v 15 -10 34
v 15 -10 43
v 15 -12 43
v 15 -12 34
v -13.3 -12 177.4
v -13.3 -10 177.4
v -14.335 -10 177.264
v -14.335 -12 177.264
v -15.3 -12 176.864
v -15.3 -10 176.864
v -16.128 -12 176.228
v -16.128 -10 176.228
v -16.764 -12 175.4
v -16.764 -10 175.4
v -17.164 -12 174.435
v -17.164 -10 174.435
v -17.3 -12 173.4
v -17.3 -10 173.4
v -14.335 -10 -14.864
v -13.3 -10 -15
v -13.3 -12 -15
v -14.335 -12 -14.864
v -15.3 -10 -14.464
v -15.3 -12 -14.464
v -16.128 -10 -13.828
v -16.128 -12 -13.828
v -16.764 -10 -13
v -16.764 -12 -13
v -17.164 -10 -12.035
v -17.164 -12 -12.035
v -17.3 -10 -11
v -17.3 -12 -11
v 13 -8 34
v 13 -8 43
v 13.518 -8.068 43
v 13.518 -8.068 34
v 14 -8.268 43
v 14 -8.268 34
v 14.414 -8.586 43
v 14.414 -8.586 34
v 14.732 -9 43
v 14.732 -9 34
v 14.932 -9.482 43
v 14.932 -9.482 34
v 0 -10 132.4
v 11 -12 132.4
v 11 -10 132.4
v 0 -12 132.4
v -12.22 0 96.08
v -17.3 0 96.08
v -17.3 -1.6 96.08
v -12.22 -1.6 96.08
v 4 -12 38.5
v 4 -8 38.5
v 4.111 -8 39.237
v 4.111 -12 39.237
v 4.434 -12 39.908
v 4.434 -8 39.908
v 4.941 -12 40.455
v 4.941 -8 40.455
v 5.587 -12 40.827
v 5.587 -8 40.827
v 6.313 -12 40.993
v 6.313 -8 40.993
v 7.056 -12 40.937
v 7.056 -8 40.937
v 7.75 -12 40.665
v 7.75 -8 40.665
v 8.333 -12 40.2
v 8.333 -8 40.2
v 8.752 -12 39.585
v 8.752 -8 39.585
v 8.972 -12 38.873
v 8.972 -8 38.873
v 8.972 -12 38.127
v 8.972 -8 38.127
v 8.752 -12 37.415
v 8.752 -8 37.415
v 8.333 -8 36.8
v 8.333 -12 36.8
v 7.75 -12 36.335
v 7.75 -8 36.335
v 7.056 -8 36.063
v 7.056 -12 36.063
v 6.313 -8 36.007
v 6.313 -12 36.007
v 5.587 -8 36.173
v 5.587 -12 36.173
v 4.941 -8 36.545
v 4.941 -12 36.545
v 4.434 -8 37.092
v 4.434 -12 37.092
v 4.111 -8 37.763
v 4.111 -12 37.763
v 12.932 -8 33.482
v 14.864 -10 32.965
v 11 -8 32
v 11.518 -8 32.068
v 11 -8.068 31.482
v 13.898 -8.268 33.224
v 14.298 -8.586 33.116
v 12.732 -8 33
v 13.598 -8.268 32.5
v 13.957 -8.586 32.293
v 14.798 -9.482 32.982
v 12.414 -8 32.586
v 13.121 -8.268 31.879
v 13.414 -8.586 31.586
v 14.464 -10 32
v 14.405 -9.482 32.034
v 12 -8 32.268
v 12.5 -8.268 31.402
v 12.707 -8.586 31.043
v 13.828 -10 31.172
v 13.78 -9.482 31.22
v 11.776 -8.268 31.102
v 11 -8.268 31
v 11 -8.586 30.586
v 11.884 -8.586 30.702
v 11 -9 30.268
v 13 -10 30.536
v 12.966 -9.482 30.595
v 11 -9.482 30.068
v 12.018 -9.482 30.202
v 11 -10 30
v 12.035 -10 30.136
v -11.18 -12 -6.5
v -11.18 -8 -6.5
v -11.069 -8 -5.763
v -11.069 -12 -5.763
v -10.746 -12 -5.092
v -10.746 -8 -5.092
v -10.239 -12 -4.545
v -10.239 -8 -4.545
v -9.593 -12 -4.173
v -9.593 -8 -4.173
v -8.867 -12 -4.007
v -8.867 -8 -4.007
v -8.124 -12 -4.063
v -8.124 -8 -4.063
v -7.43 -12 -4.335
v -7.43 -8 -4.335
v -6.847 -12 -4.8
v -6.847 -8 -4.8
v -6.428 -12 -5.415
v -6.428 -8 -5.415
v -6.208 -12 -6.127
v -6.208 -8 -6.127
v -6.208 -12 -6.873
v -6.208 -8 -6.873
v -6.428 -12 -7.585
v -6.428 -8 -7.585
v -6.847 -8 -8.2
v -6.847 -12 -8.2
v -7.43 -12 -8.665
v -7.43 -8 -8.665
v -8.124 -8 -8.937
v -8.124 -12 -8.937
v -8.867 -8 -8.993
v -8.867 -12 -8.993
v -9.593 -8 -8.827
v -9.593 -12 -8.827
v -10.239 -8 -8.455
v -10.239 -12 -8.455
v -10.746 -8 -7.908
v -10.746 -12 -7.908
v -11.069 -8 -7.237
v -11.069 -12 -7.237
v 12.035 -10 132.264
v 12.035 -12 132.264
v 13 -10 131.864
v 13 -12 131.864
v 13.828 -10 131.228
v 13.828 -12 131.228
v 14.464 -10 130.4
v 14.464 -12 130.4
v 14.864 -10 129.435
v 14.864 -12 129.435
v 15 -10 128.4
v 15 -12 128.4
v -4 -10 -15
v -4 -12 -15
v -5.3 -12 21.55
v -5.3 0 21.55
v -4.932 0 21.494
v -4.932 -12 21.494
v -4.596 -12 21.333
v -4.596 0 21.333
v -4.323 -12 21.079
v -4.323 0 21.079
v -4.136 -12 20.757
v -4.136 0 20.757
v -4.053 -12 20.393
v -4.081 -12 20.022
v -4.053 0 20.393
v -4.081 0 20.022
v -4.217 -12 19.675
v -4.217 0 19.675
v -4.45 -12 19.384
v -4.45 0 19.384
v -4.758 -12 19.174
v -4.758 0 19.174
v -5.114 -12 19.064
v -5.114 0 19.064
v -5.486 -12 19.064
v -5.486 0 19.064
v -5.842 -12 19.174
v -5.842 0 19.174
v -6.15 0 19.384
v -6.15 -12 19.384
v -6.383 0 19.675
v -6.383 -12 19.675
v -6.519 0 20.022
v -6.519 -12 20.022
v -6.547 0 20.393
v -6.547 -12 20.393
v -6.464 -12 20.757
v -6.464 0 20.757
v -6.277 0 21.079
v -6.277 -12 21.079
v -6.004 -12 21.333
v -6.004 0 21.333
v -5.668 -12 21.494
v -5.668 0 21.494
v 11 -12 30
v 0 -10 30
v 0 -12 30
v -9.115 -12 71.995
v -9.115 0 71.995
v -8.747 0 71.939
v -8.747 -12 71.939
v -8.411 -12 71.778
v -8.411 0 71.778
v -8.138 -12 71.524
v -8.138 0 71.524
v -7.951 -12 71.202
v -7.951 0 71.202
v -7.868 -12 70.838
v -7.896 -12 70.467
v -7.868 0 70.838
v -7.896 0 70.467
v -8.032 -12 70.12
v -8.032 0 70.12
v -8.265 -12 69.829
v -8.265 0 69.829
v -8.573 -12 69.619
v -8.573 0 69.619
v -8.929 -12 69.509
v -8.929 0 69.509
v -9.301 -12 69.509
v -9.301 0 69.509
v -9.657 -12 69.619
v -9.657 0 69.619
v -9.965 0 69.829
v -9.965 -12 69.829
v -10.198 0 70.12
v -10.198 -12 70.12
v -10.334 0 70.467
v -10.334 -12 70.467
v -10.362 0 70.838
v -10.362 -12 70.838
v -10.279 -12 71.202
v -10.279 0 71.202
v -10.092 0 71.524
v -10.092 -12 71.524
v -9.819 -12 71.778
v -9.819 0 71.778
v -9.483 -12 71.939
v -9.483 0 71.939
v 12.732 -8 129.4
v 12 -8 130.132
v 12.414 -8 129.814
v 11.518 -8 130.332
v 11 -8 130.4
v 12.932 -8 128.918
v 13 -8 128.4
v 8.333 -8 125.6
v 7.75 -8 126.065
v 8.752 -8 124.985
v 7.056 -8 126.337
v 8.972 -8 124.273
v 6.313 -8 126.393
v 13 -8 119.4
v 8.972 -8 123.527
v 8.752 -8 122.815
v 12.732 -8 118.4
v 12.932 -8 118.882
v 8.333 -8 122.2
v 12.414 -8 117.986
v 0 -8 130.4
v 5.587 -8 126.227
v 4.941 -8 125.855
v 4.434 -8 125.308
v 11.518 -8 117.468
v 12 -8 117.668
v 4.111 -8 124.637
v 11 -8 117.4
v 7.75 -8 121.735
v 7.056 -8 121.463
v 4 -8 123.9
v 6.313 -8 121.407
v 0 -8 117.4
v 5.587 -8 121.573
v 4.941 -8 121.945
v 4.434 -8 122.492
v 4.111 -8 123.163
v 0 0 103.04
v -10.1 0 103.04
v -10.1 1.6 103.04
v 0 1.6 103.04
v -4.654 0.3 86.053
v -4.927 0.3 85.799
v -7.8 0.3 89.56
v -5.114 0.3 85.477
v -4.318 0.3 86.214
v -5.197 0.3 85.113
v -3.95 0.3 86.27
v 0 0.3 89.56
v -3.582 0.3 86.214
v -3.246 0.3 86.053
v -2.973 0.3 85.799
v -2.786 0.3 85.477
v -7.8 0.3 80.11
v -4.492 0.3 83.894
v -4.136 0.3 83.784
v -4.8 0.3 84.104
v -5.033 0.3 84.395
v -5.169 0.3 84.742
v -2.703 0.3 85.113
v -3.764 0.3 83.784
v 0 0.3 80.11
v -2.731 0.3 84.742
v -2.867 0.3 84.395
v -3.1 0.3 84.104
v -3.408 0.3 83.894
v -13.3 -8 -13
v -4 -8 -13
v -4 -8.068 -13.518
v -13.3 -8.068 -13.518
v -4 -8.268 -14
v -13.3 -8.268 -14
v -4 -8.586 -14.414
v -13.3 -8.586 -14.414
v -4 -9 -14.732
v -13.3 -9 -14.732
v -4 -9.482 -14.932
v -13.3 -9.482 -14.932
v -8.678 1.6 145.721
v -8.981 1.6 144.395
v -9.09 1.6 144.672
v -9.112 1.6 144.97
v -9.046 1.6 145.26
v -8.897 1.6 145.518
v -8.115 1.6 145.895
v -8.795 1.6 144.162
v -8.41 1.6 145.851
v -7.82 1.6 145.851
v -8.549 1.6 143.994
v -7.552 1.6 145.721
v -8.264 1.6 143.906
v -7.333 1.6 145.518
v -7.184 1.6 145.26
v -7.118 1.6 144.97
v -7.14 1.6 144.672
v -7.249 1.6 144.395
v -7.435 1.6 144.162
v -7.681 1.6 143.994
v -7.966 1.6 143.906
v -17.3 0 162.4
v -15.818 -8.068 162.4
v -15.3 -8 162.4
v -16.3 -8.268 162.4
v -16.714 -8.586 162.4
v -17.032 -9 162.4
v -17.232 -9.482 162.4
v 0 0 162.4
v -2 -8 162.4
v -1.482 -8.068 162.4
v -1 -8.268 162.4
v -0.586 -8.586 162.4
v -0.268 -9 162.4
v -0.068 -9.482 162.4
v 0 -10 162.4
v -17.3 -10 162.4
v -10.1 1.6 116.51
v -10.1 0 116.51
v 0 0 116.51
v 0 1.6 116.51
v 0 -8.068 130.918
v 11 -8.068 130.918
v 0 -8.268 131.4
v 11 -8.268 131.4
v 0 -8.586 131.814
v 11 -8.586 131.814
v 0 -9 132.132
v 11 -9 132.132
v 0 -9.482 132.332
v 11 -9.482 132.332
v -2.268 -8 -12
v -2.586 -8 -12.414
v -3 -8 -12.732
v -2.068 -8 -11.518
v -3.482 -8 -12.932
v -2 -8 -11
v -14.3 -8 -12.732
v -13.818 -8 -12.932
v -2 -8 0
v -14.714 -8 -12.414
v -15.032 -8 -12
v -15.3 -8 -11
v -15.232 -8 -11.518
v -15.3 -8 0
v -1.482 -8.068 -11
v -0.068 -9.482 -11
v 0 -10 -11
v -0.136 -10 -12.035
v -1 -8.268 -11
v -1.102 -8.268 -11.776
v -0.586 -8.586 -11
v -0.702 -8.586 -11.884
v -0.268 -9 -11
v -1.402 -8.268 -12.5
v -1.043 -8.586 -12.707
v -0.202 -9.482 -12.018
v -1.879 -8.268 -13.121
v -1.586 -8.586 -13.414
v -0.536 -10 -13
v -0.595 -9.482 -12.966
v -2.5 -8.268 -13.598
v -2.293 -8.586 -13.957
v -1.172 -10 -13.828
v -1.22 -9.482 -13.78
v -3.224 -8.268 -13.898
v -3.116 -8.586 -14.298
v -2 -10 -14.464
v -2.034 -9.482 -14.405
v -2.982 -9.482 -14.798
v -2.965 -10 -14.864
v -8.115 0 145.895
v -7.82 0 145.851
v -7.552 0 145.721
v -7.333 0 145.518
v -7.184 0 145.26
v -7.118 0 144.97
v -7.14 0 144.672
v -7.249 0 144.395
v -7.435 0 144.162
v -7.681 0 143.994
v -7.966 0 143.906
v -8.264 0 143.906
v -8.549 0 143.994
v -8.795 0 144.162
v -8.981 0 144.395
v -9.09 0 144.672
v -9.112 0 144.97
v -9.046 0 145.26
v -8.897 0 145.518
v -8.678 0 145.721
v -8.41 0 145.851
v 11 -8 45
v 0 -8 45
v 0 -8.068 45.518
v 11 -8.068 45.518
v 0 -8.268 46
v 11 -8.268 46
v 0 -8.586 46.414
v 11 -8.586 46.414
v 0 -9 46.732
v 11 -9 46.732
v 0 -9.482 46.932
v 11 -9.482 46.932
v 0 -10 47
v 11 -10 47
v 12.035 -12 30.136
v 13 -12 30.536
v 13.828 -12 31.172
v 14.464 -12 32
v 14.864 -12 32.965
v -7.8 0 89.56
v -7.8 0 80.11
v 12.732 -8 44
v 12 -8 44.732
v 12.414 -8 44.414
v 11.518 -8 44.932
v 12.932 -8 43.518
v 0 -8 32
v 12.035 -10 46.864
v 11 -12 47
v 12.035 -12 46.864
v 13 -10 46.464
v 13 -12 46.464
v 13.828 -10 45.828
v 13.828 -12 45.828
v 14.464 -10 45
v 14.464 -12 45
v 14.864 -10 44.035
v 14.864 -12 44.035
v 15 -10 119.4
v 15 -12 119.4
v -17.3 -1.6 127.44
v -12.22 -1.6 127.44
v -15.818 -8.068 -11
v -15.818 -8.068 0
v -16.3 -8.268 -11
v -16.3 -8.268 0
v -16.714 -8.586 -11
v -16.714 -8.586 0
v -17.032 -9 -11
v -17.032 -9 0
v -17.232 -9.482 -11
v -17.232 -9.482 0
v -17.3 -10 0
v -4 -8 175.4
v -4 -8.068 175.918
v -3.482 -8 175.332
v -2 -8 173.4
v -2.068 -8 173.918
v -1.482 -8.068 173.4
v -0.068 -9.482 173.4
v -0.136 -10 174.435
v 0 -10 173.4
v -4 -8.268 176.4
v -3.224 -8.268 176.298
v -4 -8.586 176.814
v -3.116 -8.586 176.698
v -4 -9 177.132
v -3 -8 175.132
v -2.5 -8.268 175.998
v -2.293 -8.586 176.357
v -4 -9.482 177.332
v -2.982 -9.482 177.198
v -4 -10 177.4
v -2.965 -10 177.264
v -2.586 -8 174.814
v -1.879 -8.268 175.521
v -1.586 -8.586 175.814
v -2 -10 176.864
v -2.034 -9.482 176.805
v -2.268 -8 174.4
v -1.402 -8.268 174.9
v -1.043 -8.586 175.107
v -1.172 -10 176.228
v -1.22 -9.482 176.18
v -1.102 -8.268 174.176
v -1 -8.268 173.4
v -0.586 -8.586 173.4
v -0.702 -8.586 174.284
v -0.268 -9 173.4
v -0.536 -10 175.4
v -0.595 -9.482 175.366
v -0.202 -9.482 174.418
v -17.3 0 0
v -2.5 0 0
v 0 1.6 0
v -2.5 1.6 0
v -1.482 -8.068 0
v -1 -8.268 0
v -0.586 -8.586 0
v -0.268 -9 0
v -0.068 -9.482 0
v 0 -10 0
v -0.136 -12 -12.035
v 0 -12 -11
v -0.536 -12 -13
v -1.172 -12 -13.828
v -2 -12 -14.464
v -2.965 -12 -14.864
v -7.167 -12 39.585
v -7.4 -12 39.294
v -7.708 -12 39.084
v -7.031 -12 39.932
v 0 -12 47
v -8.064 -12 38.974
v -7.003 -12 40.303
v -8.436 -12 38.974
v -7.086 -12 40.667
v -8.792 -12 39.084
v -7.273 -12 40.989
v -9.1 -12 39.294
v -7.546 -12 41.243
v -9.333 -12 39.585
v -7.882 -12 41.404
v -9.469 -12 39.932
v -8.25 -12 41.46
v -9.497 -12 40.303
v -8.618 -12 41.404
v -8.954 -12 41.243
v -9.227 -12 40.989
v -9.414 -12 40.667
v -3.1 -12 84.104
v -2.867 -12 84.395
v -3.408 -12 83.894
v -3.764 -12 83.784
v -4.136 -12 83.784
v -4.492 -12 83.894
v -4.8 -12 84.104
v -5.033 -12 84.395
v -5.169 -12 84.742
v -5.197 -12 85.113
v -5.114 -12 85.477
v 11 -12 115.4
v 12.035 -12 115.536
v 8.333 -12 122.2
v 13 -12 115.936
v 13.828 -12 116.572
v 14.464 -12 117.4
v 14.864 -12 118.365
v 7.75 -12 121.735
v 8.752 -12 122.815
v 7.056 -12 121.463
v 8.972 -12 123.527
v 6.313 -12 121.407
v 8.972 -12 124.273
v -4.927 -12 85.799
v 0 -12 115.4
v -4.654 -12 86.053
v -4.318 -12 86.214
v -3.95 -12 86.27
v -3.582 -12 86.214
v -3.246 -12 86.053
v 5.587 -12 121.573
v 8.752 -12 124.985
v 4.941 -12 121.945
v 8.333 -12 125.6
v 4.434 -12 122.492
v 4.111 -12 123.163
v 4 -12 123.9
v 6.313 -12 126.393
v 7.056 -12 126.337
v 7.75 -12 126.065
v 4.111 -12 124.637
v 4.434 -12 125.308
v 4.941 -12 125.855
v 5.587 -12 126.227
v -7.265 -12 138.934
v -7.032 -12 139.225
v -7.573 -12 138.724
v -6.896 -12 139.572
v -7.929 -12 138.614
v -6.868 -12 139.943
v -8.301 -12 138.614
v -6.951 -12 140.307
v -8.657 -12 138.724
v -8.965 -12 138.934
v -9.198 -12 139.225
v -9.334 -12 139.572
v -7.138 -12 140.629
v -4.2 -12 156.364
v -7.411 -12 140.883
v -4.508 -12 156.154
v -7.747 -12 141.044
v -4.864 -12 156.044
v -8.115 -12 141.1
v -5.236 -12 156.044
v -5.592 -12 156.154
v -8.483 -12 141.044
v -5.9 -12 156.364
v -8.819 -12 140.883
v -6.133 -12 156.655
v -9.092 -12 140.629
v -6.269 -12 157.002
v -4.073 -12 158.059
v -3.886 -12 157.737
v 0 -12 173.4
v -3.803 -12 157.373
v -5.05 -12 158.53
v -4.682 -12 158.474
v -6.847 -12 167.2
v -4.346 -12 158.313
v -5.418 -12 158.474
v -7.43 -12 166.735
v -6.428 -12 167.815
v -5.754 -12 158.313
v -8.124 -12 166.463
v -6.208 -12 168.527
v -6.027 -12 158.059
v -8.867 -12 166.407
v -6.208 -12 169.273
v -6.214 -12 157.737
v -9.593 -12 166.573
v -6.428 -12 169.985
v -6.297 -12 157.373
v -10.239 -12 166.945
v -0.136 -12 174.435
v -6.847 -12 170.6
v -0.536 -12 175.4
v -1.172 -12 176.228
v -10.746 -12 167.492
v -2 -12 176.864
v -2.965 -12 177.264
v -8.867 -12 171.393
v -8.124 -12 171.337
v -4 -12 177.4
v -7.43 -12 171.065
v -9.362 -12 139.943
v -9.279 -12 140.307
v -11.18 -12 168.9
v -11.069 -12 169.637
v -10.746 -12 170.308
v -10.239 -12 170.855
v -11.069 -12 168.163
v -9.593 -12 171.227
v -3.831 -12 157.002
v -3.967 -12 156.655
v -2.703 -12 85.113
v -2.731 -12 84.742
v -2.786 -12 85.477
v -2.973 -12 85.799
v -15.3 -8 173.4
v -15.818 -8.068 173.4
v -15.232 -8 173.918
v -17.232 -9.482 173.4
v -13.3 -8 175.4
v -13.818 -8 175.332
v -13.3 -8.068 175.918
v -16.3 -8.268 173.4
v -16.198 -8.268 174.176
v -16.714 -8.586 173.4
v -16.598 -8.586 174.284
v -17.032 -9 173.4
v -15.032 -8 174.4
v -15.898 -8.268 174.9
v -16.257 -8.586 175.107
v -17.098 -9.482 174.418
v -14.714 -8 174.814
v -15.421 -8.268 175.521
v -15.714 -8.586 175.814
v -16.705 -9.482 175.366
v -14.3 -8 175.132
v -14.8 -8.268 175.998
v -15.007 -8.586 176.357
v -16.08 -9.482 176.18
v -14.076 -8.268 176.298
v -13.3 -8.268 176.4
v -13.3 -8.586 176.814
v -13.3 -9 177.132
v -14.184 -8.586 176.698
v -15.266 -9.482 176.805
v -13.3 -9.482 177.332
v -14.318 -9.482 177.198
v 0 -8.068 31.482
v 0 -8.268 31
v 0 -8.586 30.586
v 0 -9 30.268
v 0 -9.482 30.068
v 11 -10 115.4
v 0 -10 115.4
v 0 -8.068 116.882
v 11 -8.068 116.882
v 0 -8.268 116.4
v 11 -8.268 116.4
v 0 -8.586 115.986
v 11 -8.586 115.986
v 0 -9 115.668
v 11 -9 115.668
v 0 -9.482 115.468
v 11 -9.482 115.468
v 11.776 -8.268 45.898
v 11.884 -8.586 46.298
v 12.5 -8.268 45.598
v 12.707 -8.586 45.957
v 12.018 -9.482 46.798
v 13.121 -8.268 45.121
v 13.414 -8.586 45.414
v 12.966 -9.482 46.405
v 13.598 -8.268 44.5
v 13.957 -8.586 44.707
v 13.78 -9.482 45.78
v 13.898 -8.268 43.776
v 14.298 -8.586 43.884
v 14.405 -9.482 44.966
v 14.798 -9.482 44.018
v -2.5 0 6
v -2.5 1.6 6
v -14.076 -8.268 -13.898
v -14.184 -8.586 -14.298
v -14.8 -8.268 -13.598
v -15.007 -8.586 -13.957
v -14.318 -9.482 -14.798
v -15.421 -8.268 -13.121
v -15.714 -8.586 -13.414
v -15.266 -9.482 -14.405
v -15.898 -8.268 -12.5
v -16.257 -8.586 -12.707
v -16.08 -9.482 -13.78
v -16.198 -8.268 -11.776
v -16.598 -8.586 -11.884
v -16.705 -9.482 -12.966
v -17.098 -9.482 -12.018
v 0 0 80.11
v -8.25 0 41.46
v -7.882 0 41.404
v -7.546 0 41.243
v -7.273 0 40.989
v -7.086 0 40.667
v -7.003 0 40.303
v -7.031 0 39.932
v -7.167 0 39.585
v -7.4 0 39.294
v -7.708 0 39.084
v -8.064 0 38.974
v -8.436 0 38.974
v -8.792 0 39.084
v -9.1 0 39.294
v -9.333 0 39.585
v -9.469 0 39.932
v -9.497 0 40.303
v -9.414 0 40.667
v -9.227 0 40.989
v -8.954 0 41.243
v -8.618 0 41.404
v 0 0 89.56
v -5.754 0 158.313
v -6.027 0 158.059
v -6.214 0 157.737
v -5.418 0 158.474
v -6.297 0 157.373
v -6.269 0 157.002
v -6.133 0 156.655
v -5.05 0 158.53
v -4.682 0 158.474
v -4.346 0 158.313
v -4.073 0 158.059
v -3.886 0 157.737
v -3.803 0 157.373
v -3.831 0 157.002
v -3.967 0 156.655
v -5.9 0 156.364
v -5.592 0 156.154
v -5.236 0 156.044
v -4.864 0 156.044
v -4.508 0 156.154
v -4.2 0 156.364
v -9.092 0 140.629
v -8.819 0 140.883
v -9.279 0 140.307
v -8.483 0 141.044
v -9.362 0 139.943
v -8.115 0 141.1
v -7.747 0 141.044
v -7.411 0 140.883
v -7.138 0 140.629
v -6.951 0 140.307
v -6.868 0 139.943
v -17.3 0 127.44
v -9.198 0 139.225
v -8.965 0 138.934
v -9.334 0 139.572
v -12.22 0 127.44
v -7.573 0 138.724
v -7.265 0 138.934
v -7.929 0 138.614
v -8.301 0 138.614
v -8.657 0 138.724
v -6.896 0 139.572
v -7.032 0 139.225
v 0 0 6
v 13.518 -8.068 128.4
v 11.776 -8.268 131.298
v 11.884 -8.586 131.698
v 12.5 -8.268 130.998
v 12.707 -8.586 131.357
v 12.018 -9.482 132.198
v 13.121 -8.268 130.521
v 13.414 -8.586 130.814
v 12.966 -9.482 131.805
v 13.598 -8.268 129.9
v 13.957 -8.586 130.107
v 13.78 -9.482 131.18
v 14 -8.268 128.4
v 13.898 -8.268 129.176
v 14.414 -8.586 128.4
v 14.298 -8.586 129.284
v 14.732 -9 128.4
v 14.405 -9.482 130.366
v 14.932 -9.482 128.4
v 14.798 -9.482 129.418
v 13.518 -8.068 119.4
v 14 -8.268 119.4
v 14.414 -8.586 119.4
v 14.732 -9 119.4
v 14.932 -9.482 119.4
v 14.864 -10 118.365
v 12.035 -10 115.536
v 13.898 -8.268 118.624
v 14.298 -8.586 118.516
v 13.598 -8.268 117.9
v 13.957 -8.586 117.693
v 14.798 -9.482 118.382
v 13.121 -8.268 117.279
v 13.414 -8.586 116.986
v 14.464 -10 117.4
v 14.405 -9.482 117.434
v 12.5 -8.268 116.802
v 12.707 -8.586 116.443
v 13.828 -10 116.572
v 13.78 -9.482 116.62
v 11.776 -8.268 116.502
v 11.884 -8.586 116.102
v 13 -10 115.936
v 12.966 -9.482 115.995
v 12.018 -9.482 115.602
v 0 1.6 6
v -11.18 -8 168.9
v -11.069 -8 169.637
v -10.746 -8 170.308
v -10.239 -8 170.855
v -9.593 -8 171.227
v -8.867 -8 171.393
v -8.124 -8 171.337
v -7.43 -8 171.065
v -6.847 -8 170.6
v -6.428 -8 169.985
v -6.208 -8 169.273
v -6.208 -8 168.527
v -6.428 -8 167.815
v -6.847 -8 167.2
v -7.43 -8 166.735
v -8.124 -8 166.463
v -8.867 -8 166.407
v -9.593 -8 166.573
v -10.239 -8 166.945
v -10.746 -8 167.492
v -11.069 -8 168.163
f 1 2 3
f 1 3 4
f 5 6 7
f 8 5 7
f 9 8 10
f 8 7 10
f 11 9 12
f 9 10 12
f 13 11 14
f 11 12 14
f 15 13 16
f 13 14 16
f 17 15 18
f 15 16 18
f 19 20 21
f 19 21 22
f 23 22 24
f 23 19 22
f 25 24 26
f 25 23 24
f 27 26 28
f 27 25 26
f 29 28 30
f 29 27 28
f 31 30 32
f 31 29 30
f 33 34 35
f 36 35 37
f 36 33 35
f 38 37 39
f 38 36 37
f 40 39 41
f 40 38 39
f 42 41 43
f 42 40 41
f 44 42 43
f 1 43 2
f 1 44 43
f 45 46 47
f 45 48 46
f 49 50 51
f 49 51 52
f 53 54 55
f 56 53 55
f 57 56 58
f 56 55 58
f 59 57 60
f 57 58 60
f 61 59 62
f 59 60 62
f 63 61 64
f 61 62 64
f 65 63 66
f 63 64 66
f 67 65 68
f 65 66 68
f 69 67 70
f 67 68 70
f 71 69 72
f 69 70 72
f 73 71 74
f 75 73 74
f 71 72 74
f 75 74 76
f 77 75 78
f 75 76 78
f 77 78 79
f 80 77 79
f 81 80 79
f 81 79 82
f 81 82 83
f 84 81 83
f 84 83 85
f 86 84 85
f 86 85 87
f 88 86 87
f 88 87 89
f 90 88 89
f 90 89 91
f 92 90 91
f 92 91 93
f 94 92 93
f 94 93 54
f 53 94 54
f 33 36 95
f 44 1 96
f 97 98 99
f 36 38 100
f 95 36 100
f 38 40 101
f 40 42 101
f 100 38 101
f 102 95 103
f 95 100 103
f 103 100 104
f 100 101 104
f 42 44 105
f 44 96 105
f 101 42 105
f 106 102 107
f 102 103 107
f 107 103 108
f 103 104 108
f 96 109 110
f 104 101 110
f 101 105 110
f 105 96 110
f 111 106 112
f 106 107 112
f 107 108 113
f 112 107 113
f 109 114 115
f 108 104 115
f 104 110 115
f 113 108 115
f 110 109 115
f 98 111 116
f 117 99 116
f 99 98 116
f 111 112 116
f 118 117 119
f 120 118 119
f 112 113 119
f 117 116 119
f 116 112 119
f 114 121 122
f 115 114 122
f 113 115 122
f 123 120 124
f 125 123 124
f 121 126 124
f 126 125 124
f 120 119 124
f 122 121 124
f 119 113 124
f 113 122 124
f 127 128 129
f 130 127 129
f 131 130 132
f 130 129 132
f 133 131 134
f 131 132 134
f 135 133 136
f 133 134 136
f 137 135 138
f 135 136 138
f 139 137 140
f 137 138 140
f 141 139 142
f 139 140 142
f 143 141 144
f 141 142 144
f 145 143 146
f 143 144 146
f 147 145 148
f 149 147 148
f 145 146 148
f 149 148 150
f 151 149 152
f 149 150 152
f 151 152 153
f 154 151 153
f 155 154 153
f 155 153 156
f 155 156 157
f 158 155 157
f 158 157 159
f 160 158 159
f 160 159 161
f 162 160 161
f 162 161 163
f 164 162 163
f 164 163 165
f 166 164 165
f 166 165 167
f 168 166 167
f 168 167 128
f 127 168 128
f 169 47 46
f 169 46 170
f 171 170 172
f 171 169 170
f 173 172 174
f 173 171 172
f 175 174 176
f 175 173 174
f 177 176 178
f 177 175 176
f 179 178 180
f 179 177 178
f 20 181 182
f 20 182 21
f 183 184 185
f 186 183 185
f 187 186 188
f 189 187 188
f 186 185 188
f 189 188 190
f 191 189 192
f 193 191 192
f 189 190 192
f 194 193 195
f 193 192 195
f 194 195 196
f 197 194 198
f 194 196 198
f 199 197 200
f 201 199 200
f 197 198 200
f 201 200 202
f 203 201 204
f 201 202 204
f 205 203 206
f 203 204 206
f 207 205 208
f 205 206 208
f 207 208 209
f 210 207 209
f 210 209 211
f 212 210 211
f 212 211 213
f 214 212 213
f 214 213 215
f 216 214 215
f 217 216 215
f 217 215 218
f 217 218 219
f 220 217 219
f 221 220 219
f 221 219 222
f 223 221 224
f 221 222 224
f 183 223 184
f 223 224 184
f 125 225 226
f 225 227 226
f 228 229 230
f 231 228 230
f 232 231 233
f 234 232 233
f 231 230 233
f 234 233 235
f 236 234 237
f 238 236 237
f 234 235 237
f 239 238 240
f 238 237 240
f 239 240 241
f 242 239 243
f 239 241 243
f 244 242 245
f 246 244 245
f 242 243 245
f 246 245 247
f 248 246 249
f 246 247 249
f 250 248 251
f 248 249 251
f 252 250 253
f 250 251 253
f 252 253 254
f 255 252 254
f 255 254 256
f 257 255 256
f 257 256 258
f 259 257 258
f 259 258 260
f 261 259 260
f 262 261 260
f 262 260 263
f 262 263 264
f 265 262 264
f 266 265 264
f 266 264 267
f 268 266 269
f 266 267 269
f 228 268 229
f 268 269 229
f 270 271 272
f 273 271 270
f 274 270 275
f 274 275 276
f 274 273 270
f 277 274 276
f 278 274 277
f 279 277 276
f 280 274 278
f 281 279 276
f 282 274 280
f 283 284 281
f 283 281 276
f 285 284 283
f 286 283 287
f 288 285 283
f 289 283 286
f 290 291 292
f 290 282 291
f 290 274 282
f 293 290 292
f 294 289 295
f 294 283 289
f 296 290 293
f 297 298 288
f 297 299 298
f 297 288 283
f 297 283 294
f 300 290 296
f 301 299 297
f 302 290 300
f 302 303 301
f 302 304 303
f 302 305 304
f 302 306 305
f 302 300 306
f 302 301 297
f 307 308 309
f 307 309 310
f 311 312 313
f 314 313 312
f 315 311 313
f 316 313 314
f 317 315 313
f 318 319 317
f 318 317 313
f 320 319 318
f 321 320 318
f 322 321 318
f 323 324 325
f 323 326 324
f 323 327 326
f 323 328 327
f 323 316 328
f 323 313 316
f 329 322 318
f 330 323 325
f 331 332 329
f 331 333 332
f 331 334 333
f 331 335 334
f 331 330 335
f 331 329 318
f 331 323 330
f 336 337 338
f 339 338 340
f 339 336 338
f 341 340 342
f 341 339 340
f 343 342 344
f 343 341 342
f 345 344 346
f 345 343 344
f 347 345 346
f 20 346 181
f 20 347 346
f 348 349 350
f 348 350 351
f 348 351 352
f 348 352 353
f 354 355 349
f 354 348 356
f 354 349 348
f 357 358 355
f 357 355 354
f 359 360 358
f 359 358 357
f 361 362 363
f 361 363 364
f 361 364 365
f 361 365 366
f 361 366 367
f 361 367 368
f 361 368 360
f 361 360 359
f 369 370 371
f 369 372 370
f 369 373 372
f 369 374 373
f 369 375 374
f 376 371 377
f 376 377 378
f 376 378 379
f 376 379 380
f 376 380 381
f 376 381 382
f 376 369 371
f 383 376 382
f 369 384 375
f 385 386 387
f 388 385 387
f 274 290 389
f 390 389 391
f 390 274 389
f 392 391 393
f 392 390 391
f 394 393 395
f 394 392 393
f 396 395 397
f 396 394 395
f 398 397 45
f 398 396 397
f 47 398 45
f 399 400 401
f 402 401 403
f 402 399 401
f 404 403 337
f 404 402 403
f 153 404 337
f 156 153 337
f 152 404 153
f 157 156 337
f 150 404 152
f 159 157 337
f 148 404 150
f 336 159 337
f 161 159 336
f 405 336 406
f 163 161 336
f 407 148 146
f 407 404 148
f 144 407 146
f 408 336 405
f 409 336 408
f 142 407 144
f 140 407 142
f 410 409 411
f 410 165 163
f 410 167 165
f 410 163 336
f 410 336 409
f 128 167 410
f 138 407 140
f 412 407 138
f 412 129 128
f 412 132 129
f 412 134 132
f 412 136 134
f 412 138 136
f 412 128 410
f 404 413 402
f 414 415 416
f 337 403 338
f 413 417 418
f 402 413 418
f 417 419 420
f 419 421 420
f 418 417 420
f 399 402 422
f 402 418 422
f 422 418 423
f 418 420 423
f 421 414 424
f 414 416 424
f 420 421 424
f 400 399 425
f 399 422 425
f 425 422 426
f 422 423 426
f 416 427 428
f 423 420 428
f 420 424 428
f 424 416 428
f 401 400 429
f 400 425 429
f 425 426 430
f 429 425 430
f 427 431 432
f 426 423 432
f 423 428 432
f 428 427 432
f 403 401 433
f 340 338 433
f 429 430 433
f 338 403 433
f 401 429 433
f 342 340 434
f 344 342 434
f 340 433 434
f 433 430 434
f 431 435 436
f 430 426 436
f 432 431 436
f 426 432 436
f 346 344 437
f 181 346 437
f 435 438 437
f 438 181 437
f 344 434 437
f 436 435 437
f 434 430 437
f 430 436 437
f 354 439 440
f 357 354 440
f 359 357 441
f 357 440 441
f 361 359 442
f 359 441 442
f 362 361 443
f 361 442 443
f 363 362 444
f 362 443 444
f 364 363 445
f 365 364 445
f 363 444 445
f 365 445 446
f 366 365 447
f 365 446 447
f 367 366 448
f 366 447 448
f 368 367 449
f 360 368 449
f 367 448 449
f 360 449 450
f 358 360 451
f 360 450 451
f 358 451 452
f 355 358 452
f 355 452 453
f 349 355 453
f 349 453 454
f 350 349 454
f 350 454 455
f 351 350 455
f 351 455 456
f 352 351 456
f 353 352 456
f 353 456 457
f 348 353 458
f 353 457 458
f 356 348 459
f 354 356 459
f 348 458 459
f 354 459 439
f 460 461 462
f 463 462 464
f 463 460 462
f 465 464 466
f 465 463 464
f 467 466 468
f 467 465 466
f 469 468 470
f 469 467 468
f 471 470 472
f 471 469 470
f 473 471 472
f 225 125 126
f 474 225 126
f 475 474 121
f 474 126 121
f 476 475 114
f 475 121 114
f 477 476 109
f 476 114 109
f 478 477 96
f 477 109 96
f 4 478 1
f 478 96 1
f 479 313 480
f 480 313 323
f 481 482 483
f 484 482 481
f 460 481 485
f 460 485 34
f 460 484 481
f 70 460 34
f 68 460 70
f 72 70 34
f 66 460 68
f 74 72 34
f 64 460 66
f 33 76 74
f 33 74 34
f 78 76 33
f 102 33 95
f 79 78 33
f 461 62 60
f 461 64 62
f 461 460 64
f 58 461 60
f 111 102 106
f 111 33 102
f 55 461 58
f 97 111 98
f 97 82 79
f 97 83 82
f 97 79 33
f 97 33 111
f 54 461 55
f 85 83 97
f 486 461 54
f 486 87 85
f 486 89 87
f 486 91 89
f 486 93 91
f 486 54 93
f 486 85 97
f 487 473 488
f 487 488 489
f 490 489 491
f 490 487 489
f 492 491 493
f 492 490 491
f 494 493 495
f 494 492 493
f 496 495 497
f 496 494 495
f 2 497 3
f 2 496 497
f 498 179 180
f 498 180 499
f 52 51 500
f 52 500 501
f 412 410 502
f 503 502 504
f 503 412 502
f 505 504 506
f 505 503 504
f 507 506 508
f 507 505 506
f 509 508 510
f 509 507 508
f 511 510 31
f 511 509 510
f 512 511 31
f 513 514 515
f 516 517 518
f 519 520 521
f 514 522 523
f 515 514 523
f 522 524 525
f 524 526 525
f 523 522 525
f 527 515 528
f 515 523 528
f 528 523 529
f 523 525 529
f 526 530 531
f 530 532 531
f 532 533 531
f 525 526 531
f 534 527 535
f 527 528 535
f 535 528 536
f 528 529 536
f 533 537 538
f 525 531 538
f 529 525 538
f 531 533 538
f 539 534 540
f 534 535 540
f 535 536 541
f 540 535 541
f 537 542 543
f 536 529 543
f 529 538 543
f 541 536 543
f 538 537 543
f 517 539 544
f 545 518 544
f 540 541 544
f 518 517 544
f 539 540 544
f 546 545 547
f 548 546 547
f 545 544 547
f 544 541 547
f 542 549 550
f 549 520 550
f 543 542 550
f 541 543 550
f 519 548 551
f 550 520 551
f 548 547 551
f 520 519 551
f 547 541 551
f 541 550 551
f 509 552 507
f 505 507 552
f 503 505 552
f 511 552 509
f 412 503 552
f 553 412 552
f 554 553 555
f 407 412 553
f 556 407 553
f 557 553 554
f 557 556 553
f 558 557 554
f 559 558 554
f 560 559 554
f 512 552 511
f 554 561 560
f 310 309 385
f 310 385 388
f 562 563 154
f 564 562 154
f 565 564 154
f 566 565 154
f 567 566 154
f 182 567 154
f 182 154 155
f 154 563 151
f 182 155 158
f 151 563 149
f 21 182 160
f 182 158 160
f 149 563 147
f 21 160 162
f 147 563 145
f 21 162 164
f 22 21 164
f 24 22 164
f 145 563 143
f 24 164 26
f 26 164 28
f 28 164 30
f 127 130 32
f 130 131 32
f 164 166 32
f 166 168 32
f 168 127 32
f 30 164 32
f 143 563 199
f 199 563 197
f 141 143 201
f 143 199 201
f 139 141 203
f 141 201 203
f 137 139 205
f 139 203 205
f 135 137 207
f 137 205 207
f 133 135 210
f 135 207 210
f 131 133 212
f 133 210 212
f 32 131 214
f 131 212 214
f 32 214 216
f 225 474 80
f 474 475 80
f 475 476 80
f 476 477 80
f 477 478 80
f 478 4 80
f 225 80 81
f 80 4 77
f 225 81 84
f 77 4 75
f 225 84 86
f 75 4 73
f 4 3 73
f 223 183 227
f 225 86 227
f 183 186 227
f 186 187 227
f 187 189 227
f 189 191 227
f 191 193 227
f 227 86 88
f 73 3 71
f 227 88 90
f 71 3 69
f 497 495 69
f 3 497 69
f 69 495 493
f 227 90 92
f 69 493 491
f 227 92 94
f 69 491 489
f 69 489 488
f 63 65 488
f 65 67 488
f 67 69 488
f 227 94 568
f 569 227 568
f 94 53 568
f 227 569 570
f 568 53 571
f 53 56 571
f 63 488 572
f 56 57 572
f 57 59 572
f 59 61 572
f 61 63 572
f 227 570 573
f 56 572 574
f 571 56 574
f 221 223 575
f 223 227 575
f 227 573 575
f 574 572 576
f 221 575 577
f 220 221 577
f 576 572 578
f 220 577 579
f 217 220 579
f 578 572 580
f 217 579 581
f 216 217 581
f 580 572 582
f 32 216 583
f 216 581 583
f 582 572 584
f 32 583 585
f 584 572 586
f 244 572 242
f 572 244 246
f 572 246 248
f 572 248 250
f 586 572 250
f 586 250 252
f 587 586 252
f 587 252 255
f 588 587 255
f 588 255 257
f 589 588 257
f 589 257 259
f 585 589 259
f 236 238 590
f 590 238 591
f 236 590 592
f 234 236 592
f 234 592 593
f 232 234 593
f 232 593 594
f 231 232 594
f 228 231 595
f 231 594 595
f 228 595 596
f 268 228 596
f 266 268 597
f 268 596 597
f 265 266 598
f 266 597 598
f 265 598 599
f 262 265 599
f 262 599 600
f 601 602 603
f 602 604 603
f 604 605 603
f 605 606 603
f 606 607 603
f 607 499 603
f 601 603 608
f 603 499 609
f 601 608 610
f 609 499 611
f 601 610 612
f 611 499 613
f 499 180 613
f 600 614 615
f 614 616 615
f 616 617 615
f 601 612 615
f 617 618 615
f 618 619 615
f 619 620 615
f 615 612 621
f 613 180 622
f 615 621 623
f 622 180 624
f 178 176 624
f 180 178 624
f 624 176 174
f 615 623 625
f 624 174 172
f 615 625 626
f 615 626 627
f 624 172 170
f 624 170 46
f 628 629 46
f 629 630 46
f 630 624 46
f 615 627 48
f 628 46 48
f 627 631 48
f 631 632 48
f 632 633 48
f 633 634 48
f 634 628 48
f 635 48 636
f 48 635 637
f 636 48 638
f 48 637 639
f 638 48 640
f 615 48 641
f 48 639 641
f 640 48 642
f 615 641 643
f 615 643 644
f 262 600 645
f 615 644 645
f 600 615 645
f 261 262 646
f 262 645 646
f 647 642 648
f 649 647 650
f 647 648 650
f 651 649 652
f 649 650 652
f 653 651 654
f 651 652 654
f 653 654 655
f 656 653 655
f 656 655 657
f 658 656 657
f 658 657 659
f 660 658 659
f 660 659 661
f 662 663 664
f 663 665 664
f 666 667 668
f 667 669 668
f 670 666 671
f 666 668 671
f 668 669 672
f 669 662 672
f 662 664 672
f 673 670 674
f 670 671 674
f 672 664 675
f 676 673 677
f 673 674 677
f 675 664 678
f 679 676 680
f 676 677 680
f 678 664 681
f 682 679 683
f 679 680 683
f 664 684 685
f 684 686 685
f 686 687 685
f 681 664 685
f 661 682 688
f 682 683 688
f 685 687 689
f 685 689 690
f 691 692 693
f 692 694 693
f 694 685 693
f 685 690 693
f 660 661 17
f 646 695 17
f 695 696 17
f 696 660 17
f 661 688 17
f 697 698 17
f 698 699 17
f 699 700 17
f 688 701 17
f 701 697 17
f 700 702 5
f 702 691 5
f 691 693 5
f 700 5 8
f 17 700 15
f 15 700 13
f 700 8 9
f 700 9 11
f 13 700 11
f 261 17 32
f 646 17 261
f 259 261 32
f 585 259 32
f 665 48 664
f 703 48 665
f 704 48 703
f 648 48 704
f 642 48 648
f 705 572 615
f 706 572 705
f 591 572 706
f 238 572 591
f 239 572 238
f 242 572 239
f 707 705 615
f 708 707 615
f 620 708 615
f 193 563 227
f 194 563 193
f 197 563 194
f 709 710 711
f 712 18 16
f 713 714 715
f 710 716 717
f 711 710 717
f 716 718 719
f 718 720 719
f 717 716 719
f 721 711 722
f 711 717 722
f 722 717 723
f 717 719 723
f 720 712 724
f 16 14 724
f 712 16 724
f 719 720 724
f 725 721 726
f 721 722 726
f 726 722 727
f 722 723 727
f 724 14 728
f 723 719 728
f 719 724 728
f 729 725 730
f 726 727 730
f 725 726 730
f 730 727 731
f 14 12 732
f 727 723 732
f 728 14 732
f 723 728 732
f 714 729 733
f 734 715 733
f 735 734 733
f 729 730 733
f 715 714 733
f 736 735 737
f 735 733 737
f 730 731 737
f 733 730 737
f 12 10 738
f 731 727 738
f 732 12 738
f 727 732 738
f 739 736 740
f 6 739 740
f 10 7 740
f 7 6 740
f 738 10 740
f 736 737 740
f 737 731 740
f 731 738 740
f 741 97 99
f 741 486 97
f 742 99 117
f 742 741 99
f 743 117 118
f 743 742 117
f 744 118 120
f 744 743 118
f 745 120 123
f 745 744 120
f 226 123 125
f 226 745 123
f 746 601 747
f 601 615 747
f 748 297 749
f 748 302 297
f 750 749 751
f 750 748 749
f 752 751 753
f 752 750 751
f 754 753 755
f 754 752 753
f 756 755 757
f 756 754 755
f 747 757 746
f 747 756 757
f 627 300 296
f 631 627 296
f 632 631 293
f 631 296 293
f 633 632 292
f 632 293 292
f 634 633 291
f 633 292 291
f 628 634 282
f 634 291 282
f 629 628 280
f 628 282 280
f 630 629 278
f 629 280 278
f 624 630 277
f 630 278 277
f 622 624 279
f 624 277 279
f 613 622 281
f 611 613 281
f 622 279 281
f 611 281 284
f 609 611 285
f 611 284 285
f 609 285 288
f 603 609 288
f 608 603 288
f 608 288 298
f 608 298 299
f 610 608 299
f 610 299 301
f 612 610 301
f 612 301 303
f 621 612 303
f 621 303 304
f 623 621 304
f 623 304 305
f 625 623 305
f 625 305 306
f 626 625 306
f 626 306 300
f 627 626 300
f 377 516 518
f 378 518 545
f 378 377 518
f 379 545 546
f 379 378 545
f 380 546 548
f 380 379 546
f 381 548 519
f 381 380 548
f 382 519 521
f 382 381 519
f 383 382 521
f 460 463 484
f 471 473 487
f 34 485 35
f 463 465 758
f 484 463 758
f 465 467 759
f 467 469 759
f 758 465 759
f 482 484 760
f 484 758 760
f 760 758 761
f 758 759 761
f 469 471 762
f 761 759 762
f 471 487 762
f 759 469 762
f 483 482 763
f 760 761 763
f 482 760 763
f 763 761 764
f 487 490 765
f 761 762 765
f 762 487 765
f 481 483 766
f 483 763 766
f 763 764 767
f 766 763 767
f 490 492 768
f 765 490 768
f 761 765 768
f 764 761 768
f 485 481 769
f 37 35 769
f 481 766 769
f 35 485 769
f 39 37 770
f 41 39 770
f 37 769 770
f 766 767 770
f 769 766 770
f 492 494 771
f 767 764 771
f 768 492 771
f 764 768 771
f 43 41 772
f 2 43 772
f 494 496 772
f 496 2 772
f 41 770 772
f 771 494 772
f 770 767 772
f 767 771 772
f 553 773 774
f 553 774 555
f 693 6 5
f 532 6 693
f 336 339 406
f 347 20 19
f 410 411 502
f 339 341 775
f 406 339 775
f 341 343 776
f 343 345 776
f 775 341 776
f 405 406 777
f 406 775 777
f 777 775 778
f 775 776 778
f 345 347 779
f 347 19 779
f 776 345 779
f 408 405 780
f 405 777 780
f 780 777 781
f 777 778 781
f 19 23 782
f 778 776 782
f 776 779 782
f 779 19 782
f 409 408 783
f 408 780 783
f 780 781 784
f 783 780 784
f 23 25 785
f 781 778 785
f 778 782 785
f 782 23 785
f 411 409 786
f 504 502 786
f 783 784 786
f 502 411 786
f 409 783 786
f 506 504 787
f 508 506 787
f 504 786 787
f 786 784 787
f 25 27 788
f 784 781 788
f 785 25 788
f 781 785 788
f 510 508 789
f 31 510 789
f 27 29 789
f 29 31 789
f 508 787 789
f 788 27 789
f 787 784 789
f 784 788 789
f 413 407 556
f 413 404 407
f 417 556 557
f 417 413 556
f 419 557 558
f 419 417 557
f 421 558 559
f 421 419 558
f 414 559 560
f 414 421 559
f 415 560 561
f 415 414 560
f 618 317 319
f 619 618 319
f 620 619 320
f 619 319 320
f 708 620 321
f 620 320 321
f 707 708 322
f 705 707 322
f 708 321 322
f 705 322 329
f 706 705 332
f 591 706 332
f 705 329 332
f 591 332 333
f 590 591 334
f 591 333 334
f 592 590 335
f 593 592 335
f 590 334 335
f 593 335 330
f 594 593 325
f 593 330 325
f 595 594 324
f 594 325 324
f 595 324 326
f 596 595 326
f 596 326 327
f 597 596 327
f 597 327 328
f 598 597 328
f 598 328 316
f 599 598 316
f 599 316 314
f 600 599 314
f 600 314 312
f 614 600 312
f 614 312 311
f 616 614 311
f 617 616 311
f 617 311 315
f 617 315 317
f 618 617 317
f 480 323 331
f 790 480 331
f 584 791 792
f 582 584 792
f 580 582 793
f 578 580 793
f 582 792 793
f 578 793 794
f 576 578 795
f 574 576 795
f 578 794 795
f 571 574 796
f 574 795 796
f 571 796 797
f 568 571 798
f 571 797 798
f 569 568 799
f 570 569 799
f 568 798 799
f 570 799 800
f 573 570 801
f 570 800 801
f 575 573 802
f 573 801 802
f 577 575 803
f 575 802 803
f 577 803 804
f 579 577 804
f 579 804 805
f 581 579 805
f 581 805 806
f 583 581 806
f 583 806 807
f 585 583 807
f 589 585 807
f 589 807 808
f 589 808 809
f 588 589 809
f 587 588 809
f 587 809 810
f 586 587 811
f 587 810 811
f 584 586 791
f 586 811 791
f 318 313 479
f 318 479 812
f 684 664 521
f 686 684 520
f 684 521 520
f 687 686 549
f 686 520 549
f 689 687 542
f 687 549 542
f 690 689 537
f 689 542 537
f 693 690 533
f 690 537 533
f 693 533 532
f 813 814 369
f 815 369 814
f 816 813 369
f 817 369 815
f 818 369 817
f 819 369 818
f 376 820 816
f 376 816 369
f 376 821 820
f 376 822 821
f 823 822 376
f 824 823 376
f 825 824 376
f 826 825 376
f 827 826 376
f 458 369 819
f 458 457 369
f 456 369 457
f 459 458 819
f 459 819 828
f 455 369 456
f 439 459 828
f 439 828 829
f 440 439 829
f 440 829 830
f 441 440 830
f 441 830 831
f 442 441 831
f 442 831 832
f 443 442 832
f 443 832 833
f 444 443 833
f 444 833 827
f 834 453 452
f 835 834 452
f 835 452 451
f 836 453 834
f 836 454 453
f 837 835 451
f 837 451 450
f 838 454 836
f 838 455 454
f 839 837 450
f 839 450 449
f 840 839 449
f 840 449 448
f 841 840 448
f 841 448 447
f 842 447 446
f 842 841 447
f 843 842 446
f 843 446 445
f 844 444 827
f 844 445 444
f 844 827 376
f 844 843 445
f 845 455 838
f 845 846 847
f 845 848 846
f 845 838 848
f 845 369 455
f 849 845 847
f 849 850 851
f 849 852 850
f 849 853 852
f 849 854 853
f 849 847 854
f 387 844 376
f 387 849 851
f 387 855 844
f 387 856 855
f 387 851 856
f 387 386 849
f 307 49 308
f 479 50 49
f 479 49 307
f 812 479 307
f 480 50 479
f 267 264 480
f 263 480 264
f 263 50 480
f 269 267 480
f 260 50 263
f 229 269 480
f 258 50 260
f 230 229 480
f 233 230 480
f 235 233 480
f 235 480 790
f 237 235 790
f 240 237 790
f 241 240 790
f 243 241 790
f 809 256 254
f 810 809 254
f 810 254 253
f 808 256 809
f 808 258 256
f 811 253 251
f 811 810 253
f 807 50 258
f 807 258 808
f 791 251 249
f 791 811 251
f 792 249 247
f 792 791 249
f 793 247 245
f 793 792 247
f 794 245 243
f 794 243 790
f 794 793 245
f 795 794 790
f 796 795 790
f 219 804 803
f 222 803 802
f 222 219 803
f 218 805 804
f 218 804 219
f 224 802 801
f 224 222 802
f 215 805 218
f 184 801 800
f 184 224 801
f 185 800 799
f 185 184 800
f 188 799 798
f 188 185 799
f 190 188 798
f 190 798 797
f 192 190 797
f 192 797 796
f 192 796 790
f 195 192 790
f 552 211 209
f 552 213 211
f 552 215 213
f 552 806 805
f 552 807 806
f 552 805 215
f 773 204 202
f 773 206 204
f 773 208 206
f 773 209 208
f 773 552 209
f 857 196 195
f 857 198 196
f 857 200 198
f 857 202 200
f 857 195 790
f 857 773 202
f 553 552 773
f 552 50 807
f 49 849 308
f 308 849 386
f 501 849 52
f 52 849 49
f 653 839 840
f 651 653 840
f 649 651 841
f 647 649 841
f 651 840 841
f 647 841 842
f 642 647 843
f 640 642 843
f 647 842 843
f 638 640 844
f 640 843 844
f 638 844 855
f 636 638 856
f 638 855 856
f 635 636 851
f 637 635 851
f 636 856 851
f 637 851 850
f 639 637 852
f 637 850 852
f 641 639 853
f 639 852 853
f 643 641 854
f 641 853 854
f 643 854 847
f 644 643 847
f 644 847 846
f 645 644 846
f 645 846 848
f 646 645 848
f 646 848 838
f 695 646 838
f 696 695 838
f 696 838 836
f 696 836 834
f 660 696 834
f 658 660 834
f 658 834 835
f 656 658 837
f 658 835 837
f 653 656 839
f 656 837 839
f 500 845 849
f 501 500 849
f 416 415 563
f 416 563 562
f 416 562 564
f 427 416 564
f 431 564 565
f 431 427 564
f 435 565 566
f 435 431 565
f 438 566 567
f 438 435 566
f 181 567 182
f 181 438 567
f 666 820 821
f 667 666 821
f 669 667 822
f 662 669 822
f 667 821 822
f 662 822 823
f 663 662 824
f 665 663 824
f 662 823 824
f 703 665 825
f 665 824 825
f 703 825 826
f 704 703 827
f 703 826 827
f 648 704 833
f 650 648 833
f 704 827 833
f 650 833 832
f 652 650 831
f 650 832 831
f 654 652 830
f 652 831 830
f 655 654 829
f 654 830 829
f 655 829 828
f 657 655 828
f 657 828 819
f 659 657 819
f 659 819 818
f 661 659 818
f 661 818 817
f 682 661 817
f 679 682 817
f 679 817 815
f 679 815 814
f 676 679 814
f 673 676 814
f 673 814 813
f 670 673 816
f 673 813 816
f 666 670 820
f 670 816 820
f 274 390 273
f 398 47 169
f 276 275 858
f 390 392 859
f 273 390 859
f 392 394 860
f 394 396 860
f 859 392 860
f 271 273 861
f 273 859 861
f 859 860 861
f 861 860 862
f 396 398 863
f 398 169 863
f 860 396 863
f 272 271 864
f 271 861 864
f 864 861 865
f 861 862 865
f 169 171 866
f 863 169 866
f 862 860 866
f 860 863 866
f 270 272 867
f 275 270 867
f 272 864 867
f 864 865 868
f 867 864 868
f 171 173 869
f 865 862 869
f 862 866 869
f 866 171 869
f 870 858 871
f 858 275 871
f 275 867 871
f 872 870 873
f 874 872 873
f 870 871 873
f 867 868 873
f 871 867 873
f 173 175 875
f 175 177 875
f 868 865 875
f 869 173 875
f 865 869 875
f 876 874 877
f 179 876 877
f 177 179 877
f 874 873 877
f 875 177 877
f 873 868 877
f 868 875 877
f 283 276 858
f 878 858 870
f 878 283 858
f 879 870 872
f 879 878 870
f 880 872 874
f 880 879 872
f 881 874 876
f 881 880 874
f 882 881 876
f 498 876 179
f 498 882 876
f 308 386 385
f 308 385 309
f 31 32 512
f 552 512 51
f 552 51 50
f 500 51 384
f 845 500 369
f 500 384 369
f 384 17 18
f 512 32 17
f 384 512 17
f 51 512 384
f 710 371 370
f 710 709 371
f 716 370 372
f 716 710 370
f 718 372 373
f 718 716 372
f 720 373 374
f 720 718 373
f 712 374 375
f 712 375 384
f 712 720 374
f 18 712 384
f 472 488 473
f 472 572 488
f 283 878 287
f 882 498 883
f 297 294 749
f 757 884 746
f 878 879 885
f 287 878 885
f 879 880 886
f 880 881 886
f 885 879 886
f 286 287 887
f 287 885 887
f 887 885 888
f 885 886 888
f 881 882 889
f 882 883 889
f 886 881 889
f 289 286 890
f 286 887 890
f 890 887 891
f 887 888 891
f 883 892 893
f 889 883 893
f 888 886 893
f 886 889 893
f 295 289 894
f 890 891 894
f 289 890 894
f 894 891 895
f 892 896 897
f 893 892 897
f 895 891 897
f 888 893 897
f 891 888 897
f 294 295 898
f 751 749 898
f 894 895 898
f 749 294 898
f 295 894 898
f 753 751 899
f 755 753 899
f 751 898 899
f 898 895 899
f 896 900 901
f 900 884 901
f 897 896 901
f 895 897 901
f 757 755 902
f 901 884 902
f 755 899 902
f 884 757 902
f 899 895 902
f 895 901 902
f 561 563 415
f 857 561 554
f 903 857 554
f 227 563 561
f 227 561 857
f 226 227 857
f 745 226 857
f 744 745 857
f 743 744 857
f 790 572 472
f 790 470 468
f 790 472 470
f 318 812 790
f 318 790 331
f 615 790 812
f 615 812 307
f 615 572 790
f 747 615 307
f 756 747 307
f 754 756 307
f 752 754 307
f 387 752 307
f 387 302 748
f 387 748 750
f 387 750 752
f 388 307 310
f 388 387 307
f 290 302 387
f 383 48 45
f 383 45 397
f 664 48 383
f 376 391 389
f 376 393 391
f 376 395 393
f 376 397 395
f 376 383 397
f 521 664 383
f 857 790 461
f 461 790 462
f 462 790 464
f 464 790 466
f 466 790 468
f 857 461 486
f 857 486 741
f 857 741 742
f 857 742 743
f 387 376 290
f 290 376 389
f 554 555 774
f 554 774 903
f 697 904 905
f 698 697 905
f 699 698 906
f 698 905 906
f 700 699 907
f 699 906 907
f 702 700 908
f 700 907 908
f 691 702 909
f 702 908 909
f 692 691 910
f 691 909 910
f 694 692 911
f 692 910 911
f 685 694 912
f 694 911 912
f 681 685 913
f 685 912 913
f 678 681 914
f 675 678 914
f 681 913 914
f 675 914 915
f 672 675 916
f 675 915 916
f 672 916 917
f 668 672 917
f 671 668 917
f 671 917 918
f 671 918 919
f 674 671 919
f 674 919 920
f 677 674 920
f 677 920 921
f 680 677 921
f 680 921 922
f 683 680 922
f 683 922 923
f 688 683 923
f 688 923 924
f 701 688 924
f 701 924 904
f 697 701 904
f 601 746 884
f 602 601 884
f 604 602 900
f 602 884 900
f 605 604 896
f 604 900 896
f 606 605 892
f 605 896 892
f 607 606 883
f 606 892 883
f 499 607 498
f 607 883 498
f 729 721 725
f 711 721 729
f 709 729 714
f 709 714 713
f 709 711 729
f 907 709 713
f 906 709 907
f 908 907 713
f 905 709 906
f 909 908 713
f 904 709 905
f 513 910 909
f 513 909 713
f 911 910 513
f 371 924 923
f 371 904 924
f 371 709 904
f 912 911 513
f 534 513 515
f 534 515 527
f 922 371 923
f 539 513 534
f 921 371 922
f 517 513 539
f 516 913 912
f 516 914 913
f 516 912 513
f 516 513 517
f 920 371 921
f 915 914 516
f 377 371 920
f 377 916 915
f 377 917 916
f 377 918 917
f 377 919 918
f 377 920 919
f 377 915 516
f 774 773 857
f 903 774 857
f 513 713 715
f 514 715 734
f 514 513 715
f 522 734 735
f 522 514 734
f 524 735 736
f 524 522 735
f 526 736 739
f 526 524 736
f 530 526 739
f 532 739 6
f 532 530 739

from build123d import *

# Parameters (mm, degrees)
SKETCH1_R           = 1
SKETCH1_R_2         = 1.25
SKETCH1_W           = 10.1
SKETCH1_H           = 13.47
SKETCH1_W_2         = 2.5
SKETCH1_H_2         = 6
SKETCH1_W_3         = 5.08
SKETCH1_H_3         = 31.36
BOSS_EXTRUDE1_DEPTH = 12
SKETCH1_3_W         = 10.1
SKETCH1_3_H         = 13.47
SKETCH1_3_W_2       = 2.5
SKETCH1_3_H_2       = 6
SKETCH1_3_R         = 1
BOSS_EXTRUDE2_DEPTH = 1.6
SKETCH1_4_W         = 5.08
SKETCH1_4_H         = 31.36
CUT_EXTRUDE1_DEPTH  = 1.6
BOSS_EXTRUDE3_START = 0.3
SKETCH2_W           = 7.8
SKETCH2_H           = 9.45
SKETCH2_R           = 1.25
BOSS_EXTRUDE3_DEPTH = 0.3
SKETCH3_W           = 17.3
SKETCH3_H           = 4
BOSS_EXTRUDE4_DEPTH = 15
SKETCH4_W           = 17.3
SKETCH4_H           = 4
BOSS_EXTRUDE5_DEPTH = 15
SKETCH5_W           = 17
SKETCH5_H           = 4
BOSS_EXTRUDE6_DEPTH = 15
FILLET1_R           = 4
FILLET2_R           = 2
CUT_EXTRUDE2_REACH  = 180.5
SKETCH6_R           = 2.5


with BuildPart() as part:
    # Sketch1 → Boss-Extrude1 (new body)
    # profile 1 of 5: a face of its own
    with BuildSketch(Plane(origin=(0, 0, 0), x_dir=(1, 0, 0), z_dir=(0, 1, 0))):
        Polygon((-2.5, -6), (-2.5, 0), (-17.3, 0), (-17.3, -96.08), (-12.22, -96.08), (-12.22, -127.44), (-17.3, -127.44), (-17.3, -162.4), (0, -162.4), (0, -116.51), (-10.1, -116.51), (-10.1, -103.04), (0, -103.04), (0, -6), align=None)
        with Locations((-8.115, -144.895)):
            Circle(SKETCH1_R, mode=Mode.SUBTRACT)
        with Locations(Location((-5.05, -157.28, 0), (0, 0, 270))):
            Circle(SKETCH1_R_2, mode=Mode.SUBTRACT)
        with Locations(Location((-8.115, -139.85, 0), (0, 0, 270))):
            Circle(SKETCH1_R_2, mode=Mode.SUBTRACT)
        with Locations(Location((-3.95, -85.02, 0), (0, 0, 270))):
            Circle(SKETCH1_R_2, mode=Mode.SUBTRACT)
        with Locations(Location((-9.115, -70.745, 0), (0, 0, 270))):
            Circle(SKETCH1_R_2, mode=Mode.SUBTRACT)
        with Locations(Location((-8.25, -40.21, 0), (0, 0, 270))):
            Circle(SKETCH1_R_2, mode=Mode.SUBTRACT)
        with Locations(Location((-5.3, -20.3, 0), (0, 0, 270))):
            Circle(SKETCH1_R_2, mode=Mode.SUBTRACT)
    # profile 2 of 5: a face of its own
    with BuildSketch(Plane(origin=(0, 0, 0), x_dir=(1, 0, 0), z_dir=(0, 1, 0))):
        with Locations((-5.05, -109.775)):
            Rectangle(SKETCH1_W, SKETCH1_H)
    # profile 3 of 5: a face of its own
    with BuildSketch(Plane(origin=(0, 0, 0), x_dir=(1, 0, 0), z_dir=(0, 1, 0))):
        with Locations((-1.25, -3)):
            Rectangle(SKETCH1_W_2, SKETCH1_H_2)
    # profile 4 of 5: a face of its own
    with BuildSketch(Plane(origin=(0, 0, 0), x_dir=(1, 0, 0), z_dir=(0, 1, 0))):
        with Locations((-14.76, -111.76)):
            Rectangle(SKETCH1_W_3, SKETCH1_H_3)
    # profile 5 of 5: a face of its own
    with BuildSketch(Plane(origin=(0, 0, 0), x_dir=(1, 0, 0), z_dir=(0, 1, 0))):
        with Locations((-8.115, -144.895)):
            Circle(SKETCH1_R)
    extrude(amount=-BOSS_EXTRUDE1_DEPTH)

    # Sketch1<3> → Boss-Extrude2 (add)
    with BuildSketch(Plane(origin=(0, 0, 0), x_dir=(1, 0, 0), z_dir=(0, 1, 0))):
        with Locations((-5.05, -109.775)):
            Rectangle(SKETCH1_3_W, SKETCH1_3_H)
        with Locations((-1.25, -3)):
            Rectangle(SKETCH1_3_W_2, SKETCH1_3_H_2)
        with Locations(Location((-8.115, -144.895, 0), (0, 0, 270))):
            Circle(SKETCH1_3_R)
    extrude(amount=BOSS_EXTRUDE2_DEPTH)

    # Sketch1<4> → Cut-Extrude1 (cut)
    with BuildSketch(Plane(origin=(0, 0, 0), x_dir=(1, 0, 0), z_dir=(0, 1, 0))):
        with Locations((-14.76, -111.76)):
            Rectangle(SKETCH1_4_W, SKETCH1_4_H)
    extrude(amount=-CUT_EXTRUDE1_DEPTH, mode=Mode.SUBTRACT)

    # Sketch2 → Boss-Extrude3 (add)
    with BuildSketch(Plane(origin=(0, 0, 0), x_dir=(1, 0, 0), z_dir=(0, 1, 0)).offset(BOSS_EXTRUDE3_START)):
        with Locations((-3.9, -84.835)):
            Rectangle(SKETCH2_W, SKETCH2_H)
        with Locations(Location((-3.95, -85.02, 0), (0, 0, 270))):
            Circle(SKETCH2_R, mode=Mode.SUBTRACT)
    extrude(amount=-BOSS_EXTRUDE3_DEPTH)

    # Sketch3 → Boss-Extrude4 (add)
    with BuildSketch(Plane.XY.offset(162.4)):
        with Locations((-8.65, -10)):
            Rectangle(SKETCH3_W, SKETCH3_H)
    extrude(amount=BOSS_EXTRUDE4_DEPTH)

    # Sketch4 → Boss-Extrude5 (add)
    with BuildSketch(Plane(origin=(0, 0, 0), x_dir=(-1, 0, 0), z_dir=(0, 0, -1))):
        with Locations((8.65, -10)):
            Rectangle(SKETCH4_W, SKETCH4_H)
    extrude(amount=BOSS_EXTRUDE5_DEPTH)

    # Sketch5 → Boss-Extrude6 (add)
    with BuildSketch(Plane(origin=(0, 0, 0), x_dir=(0, 0, -1), z_dir=(1, 0, 0))):
        with Locations((-123.9, -10)):
            Rectangle(SKETCH5_W, SKETCH5_H)
        with Locations((-38.5, -10)):
            Rectangle(SKETCH5_W, SKETCH5_H)
    extrude(amount=BOSS_EXTRUDE6_DEPTH)

    # Fillet1
    fillet1_edges = [part.edges().sort_by_distance(p)[0] for p in [
        (-17.3, -10, -15),
        (0, -10, -15),
        (15, -10, 132.4),
        (15, -10, 115.4),
        (15, -10, 47),
        (15, -10, 30),
        (0, -10, 177.4),
        (-17.3, -10, 177.4),
    ]]
    fillet(fillet1_edges, radius=FILLET1_R)

    # Fillet2
    fillet2_edges = [part.edges().sort_by_distance(p)[0] for p in [
        (-8.65, -8, -15),
        (-17.3, -8, -5.5),
        (-1.171572875, -8, -13.828427125),
        (-16.128427125, -8, -13.828427125),
        (-17.3, -8, 167.9),
        (15, -8, 38.5),
        (5.5, -8, 47),
        (5.5, -8, 30),
        (13.828427125, -8, 45.828427125),
        (13.828427125, -8, 31.171572875),
        (15, -8, 123.9),
        (5.5, -8, 132.4),
        (5.5, -8, 115.4),
        (13.828427125, -8, 131.228427125),
        (13.828427125, -8, 116.571572875),
        (-8.65, -8, 177.4),
        (-1.171572875, -8, 176.228427125),
        (-16.128427125, -8, 176.228427125),
    ]]
    fillet(fillet2_edges, radius=FILLET2_R)

    # Sketch6 → Cut-Extrude2 (cut, up to next)
    with BuildSketch(Plane(origin=(0, -8, 0), x_dir=(1, 0, 0), z_dir=(0, 1, 0)), mode=Mode.PRIVATE) as cut_extrude2_sk1:
        with Locations(Location((-8.68, 6.5, 0), (0, 0, 180))):
            Circle(SKETCH6_R)
    cut_extrude2_tool1 = extrude(cut_extrude2_sk1.sketch, amount=-CUT_EXTRUDE2_REACH, mode=Mode.PRIVATE) & part.part
    # Sketch6 → Cut-Extrude2 (cut, up to next)
    with BuildSketch(Plane(origin=(0, -8, 0), x_dir=(1, 0, 0), z_dir=(0, 1, 0)), mode=Mode.PRIVATE) as cut_extrude2_sk2:
        with Locations(Location((6.5, -38.5, 0), (0, 0, 180))):
            Circle(SKETCH6_R)
    cut_extrude2_tool2 = extrude(cut_extrude2_sk2.sketch, amount=-CUT_EXTRUDE2_REACH, mode=Mode.PRIVATE) & part.part
    # Sketch6 → Cut-Extrude2 (cut, up to next)
    with BuildSketch(Plane(origin=(0, -8, 0), x_dir=(1, 0, 0), z_dir=(0, 1, 0)), mode=Mode.PRIVATE) as cut_extrude2_sk3:
        with Locations(Location((6.5, -123.9, 0), (0, 0, 180))):
            Circle(SKETCH6_R)
    cut_extrude2_tool3 = extrude(cut_extrude2_sk3.sketch, amount=-CUT_EXTRUDE2_REACH, mode=Mode.PRIVATE) & part.part
    # Sketch6 → Cut-Extrude2 (cut, up to next)
    with BuildSketch(Plane(origin=(0, -8, 0), x_dir=(1, 0, 0), z_dir=(0, 1, 0)), mode=Mode.PRIVATE) as cut_extrude2_sk4:
        with Locations(Location((-8.68, -168.9, 0), (0, 0, 180))):
            Circle(SKETCH6_R)
    cut_extrude2_tool4 = extrude(cut_extrude2_sk4.sketch, amount=-CUT_EXTRUDE2_REACH, mode=Mode.PRIVATE) & part.part
    add(cut_extrude2_tool1.solids().sort_by_distance((-8.68, -8, -6.5))[0], mode=Mode.SUBTRACT)
    add(cut_extrude2_tool2.solids().sort_by_distance((6.5, -8, 38.5))[0], mode=Mode.SUBTRACT)
    add(cut_extrude2_tool3.solids().sort_by_distance((6.5, -8, 123.9))[0], mode=Mode.SUBTRACT)
    add(cut_extrude2_tool4.solids().sort_by_distance((-8.68, -8, 168.9))[0], mode=Mode.SUBTRACT)


solid = part.part
